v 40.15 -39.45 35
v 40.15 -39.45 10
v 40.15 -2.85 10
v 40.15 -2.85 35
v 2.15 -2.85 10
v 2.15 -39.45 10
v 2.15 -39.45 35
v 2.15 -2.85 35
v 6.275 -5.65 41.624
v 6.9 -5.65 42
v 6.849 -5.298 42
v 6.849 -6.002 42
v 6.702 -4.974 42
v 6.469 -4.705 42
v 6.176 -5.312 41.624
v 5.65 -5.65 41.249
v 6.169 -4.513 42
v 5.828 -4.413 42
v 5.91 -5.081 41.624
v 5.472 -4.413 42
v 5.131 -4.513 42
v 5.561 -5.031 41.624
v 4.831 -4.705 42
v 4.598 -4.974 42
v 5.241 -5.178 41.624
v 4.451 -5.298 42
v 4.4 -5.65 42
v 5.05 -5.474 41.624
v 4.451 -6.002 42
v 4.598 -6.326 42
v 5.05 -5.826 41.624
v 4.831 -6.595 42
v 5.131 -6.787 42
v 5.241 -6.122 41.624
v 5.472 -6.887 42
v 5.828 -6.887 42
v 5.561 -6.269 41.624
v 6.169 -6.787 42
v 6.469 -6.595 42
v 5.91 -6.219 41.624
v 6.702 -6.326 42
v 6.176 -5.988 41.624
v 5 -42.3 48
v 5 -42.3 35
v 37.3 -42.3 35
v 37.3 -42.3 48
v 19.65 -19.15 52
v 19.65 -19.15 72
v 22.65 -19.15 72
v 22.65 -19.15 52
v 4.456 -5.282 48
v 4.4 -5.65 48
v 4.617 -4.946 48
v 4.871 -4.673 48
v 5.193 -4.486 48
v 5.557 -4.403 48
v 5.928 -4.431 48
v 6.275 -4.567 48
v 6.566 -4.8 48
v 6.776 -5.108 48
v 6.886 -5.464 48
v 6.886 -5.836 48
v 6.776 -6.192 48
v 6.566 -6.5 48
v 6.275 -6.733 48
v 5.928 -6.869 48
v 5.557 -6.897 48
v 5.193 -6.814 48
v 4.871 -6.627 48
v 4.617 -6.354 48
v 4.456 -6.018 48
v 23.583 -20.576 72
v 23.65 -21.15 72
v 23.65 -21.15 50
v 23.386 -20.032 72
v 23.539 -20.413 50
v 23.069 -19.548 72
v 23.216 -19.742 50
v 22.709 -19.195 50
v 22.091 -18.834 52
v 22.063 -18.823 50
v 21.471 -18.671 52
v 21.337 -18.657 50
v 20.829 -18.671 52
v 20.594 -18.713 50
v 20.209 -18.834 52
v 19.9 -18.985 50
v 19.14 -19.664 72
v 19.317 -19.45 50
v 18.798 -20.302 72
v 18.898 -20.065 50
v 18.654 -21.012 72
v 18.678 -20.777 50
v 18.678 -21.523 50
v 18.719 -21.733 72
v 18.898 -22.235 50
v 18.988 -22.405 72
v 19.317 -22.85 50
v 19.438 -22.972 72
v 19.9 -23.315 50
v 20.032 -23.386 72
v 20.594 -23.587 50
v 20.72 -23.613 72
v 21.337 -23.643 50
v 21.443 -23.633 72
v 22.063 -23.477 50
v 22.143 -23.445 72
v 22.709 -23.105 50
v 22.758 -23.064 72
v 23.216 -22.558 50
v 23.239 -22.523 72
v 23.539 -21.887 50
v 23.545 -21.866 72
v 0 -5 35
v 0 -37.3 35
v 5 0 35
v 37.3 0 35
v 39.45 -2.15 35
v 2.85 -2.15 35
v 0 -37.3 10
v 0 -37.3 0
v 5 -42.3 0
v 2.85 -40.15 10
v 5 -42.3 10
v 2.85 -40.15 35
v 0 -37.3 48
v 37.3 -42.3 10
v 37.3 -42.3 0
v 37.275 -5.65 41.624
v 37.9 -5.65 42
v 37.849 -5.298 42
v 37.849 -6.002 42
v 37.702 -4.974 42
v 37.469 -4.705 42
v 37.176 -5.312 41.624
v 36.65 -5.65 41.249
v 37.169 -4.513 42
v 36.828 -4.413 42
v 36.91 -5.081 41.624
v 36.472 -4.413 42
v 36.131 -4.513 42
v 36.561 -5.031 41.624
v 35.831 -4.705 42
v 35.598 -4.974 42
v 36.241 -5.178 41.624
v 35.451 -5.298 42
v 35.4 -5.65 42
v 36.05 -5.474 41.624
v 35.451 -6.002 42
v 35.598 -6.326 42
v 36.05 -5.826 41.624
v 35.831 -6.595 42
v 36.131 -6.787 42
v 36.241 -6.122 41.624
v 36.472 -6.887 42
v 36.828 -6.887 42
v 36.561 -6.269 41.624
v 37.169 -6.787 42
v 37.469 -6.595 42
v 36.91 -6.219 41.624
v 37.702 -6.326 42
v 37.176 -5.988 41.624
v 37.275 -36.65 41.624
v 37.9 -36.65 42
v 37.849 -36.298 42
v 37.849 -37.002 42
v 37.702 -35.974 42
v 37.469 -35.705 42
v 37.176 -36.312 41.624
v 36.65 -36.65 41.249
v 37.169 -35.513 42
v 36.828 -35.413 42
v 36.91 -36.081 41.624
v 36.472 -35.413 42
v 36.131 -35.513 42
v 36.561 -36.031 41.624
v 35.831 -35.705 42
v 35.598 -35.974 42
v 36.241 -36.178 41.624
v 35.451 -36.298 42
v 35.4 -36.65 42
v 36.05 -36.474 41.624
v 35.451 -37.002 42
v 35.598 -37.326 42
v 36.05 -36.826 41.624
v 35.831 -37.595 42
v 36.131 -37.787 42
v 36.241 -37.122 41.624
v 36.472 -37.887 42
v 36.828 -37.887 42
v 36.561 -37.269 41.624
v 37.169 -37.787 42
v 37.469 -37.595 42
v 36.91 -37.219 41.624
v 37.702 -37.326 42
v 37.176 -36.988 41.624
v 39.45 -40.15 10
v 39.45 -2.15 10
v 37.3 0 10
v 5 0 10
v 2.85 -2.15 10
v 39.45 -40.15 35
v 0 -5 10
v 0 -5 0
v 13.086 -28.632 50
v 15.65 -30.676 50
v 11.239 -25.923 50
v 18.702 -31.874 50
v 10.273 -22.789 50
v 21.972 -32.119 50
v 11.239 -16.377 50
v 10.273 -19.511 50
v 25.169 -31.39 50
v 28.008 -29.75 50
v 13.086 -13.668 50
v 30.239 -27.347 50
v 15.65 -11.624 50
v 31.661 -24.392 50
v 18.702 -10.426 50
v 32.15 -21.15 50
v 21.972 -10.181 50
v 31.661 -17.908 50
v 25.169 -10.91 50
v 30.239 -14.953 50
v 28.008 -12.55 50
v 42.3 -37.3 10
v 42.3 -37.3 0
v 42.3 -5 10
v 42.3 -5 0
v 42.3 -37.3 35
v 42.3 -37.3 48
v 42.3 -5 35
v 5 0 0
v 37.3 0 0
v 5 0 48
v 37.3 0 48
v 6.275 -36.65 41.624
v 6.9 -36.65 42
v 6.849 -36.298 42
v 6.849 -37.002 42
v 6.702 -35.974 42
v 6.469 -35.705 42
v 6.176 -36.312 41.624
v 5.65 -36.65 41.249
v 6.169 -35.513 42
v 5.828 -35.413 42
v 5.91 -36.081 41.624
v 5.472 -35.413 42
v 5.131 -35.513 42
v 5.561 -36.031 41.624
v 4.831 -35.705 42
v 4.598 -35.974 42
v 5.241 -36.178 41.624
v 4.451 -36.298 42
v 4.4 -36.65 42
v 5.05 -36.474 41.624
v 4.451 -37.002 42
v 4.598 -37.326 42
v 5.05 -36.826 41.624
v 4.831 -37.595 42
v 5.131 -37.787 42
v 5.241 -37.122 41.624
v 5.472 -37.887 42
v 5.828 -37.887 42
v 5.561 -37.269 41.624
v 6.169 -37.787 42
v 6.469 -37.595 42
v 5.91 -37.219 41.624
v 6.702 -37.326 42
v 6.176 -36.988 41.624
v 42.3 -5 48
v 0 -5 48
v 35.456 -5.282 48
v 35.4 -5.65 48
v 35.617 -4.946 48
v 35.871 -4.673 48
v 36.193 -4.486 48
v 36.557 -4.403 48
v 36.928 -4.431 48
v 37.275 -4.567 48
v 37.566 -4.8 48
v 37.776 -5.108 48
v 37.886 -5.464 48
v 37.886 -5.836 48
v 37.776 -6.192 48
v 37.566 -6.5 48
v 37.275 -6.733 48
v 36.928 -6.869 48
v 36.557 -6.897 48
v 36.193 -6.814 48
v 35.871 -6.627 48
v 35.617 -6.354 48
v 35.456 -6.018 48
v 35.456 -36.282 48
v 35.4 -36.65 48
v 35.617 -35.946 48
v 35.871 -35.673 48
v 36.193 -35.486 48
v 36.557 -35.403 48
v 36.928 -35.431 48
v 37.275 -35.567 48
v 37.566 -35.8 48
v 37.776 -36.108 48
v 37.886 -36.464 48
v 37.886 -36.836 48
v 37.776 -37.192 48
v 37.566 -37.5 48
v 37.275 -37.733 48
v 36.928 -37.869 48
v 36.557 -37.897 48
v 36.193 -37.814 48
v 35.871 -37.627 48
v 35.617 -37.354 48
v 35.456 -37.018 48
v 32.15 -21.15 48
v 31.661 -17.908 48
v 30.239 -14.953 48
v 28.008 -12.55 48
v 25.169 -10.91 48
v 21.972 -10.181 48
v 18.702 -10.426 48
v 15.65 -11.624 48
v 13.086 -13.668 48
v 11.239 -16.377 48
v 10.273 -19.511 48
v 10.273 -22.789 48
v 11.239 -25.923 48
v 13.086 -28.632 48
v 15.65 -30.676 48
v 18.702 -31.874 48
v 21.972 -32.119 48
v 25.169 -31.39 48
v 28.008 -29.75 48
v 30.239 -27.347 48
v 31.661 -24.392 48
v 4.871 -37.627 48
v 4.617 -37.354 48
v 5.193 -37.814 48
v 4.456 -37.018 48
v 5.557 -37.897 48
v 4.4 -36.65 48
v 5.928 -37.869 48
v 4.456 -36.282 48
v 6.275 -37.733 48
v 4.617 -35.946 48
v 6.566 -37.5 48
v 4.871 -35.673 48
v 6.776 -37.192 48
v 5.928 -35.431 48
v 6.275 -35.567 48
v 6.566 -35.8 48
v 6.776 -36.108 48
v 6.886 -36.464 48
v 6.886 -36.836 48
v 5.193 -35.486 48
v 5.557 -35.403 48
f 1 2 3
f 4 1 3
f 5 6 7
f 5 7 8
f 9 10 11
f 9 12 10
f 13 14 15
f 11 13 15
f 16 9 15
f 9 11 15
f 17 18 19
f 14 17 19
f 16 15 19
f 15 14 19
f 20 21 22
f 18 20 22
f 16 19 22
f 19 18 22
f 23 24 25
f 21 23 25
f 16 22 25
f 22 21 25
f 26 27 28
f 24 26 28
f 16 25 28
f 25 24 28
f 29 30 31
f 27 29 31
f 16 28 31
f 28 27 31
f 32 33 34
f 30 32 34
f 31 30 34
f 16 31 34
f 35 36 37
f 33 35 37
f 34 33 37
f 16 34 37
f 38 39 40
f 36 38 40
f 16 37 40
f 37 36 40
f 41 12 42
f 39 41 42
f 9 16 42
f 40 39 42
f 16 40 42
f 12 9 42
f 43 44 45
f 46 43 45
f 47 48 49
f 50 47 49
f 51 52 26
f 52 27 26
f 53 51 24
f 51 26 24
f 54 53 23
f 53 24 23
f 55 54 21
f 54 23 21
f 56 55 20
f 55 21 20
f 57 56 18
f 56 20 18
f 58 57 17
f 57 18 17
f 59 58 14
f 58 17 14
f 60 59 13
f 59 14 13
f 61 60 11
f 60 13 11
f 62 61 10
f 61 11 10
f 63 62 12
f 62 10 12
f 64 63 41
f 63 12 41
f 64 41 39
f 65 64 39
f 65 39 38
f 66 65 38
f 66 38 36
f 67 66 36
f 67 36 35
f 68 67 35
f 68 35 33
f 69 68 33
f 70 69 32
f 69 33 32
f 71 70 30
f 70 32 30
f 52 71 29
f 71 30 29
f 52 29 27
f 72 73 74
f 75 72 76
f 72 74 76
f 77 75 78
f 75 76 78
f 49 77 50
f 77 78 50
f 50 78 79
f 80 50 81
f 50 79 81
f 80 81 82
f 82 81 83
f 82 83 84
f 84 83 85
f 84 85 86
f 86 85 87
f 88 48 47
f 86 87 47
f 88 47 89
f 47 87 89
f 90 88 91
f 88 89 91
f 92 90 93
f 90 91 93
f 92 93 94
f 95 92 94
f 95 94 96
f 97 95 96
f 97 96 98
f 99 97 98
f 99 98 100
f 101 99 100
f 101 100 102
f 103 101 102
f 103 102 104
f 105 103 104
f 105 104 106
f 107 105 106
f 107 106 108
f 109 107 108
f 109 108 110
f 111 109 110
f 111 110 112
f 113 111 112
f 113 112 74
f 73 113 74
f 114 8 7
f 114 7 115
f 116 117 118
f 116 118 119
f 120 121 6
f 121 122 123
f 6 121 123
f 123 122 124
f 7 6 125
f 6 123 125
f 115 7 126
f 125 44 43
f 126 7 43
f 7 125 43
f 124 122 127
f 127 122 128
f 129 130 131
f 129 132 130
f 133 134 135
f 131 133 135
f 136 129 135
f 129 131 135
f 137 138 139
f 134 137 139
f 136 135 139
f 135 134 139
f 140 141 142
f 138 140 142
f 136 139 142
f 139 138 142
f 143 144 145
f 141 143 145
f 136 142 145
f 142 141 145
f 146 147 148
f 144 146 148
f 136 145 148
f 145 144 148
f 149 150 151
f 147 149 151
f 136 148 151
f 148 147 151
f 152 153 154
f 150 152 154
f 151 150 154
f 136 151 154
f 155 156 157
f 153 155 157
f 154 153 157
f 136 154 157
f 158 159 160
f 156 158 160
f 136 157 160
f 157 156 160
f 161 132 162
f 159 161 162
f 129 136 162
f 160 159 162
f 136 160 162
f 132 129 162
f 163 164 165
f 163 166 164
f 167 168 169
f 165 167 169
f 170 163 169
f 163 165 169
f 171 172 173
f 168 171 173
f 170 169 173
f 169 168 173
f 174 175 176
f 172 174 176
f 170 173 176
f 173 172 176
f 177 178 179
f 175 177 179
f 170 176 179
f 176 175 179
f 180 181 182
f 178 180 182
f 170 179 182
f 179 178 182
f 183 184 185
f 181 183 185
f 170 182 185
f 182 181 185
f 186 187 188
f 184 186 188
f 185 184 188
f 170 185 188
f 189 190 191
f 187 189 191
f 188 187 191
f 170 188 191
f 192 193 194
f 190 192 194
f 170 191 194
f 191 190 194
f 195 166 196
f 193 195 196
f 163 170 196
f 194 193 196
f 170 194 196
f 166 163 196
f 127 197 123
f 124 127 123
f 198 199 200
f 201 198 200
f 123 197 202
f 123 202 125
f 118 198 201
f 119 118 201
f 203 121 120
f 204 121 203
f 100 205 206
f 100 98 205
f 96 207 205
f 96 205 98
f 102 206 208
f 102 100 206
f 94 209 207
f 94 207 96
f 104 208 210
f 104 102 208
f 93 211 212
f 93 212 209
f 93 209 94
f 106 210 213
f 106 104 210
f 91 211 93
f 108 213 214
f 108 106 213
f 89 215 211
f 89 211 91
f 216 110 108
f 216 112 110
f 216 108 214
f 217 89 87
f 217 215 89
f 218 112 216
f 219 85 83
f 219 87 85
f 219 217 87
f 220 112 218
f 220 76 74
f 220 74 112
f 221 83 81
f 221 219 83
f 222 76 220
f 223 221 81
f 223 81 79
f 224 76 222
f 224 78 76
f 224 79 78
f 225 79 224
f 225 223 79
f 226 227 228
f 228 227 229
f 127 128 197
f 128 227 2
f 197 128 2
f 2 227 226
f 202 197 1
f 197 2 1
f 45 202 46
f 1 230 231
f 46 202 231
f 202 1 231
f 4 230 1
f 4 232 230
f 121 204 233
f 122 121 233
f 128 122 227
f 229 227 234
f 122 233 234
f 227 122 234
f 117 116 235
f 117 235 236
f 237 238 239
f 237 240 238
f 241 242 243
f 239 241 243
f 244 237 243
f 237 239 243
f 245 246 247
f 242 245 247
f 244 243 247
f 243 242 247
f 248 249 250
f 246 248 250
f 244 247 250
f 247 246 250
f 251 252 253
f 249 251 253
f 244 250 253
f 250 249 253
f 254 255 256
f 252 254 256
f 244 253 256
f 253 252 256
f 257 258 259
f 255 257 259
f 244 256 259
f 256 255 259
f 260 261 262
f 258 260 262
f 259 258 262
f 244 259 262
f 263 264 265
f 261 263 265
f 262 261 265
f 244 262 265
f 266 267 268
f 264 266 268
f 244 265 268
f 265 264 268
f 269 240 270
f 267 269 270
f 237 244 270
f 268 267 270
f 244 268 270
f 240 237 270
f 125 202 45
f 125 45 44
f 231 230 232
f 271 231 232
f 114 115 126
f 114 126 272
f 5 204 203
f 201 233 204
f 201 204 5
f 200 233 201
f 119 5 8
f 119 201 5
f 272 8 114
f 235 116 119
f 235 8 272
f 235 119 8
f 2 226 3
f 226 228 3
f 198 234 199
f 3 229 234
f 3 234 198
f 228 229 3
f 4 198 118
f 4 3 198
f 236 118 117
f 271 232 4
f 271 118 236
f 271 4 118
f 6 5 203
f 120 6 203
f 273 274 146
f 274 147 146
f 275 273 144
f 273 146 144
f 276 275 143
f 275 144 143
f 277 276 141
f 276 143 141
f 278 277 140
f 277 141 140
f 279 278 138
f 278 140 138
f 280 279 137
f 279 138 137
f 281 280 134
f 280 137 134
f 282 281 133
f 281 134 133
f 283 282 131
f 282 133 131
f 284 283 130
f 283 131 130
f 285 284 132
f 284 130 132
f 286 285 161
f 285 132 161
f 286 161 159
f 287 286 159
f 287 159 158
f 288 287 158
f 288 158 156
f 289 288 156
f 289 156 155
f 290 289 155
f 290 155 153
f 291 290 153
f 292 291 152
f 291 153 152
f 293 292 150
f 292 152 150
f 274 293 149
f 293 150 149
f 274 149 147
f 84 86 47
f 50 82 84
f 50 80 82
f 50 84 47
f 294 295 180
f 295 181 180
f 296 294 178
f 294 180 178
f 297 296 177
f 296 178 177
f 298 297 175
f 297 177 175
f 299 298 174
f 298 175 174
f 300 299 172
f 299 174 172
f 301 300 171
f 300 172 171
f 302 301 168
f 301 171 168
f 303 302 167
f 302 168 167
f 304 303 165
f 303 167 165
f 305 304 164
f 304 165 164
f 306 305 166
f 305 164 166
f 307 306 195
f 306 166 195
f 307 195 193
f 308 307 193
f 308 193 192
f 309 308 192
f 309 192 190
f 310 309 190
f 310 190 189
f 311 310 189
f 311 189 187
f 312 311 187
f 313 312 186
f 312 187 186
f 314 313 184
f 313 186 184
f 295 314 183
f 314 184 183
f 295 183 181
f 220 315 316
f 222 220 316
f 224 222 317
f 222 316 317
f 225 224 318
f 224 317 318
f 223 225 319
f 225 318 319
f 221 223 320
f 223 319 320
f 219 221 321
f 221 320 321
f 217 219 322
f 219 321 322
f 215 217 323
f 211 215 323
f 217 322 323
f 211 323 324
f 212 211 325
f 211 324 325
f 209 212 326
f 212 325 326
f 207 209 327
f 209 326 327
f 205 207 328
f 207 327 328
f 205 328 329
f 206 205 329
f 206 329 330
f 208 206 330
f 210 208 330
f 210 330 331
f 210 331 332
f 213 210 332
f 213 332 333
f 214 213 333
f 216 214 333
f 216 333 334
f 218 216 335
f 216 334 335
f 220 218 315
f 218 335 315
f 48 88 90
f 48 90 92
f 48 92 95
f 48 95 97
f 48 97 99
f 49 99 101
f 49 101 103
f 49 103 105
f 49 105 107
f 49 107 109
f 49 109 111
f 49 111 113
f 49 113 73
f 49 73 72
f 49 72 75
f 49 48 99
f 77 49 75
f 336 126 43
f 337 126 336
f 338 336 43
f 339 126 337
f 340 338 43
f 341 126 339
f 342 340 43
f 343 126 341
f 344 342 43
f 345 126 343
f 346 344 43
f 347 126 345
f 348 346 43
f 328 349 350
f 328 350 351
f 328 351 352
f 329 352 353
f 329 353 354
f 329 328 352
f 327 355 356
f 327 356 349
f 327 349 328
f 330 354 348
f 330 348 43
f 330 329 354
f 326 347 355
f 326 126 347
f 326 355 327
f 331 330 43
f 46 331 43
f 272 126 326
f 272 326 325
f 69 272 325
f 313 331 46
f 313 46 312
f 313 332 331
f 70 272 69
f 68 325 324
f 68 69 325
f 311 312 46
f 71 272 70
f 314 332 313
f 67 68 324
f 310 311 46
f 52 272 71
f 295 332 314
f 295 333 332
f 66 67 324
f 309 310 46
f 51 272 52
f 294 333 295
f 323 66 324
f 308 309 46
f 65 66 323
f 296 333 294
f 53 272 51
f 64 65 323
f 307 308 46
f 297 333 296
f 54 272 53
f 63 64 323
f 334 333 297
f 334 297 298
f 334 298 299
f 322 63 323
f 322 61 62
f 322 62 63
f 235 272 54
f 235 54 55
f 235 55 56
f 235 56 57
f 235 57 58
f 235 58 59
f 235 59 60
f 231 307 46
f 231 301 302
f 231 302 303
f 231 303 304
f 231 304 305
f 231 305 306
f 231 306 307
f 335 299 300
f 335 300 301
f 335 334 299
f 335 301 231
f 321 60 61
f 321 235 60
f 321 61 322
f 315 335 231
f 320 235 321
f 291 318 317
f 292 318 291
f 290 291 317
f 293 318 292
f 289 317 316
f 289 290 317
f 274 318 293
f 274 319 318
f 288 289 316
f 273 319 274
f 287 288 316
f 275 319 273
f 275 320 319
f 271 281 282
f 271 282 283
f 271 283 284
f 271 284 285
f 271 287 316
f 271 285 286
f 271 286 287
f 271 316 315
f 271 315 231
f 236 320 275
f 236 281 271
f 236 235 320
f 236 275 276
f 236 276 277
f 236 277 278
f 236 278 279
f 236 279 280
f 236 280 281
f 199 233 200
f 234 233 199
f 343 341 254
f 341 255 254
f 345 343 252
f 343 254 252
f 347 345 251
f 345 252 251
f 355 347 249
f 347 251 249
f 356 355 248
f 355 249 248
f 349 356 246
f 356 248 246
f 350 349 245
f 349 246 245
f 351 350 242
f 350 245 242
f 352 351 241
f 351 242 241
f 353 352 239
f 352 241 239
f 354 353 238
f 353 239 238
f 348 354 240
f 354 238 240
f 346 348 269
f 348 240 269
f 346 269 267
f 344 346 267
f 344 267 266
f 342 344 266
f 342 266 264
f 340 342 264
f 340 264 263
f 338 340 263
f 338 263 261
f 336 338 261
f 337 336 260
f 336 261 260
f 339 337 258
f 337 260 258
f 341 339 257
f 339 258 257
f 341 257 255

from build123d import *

# Parameters (mm, degrees)
SKETCH_1_W             = 42.3
SKETCH_1_H             = 42.3
EXTRUDE_1_DEPTH        = 48
SKETCH_2_R             = 11
EXTRUDE_2_DEPTH        = 2
SKETCH_3_R             = 2.5
EXTRUDE_3_DEPTH        = 22
CHAMFER_1_SIZE         = 5
HOLE_WIZARD_M3_1_D     = 2.5
HOLE_WIZARD_M3_1_DEPTH = 6
HOLE_WIZARD_M3_1_TIP   = 0.751075774
SKETCH_7_OUTSIDE_W     = 63.022
SKETCH_7_OUTSIDE_H     = 63.022
SKETCH_7_OUTSIDE_W_2   = 38
SKETCH_7_OUTSIDE_H_2   = 38
CUT_EXTRUDE_2_DEPTH    = 25
SKETCH_8_W             = 6.700255884
SKETCH_8_H             = 1.991967966
CUT_EXTRUDE_3_DEPTH    = 20


with BuildPart() as part:
    # 草图1 → 凸台-拉伸1 (new body)
    with BuildSketch(Plane.XY):
        with Locations((21.15, -21.15)):
            Rectangle(SKETCH_1_W, SKETCH_1_H)
    extrude(amount=EXTRUDE_1_DEPTH)

    # 草图2 → 凸台-拉伸2 (add)
    with BuildSketch(Plane.XY.offset(48)):
        with Locations((21.15, -21.15)):
            Circle(SKETCH_2_R)
    extrude(amount=EXTRUDE_2_DEPTH)

    # 草图3 → 凸台-拉伸3 (add)
    with BuildSketch(Plane.XY.offset(50)):
        with Locations((21.15, -21.15)):
            Circle(SKETCH_3_R)
    extrude(amount=EXTRUDE_3_DEPTH)

    # 倒角1
    chamfer_1_edges = [part.edges().sort_by_distance(p)[0] for p in [
        (0, 0, 24),
        (42.3, 0, 24),
        (42.3, -42.3, 24),
        (0, -42.3, 24),
    ]]
    chamfer(chamfer_1_edges, length=CHAMFER_1_SIZE)

    # M3 螺纹孔1
    with Locations(Plane(origin=(5.65, -5.65, 48), x_dir=(1, 0, 0), z_dir=(0, 0, 1))):
        with Locations((0, 0), (0, -31), (31, -31), (31, 0)):
            Hole(HOLE_WIZARD_M3_1_D / 2, depth=HOLE_WIZARD_M3_1_DEPTH)
            with Locations((0, 0, -(HOLE_WIZARD_M3_1_DEPTH + HOLE_WIZARD_M3_1_TIP / 2))):  # 118° drill point
                Cone(0, HOLE_WIZARD_M3_1_D / 2, HOLE_WIZARD_M3_1_TIP, mode=Mode.SUBTRACT)

    # 草图7 outside → 切除-拉伸2 (cut)
    with BuildSketch(Plane(origin=(0, 0, 10), x_dir=(-1, 0, 0), z_dir=(0, 0, -1))):
        with Locations((-21.15, -21.15)):
            Rectangle(SKETCH_7_OUTSIDE_W, SKETCH_7_OUTSIDE_H)
        with Locations((-21.15, -21.15)):
            Rectangle(SKETCH_7_OUTSIDE_W_2, SKETCH_7_OUTSIDE_H_2, mode=Mode.SUBTRACT)
    extrude(amount=-CUT_EXTRUDE_2_DEPTH, mode=Mode.SUBTRACT)

    # 草图8 → 切除-拉伸3 (cut)
    with BuildSketch(Plane.XY.offset(72)):
        with Locations((21.681661742, -18.154016017)):
            Rectangle(SKETCH_8_W, SKETCH_8_H)
    extrude(amount=-CUT_EXTRUDE_3_DEPTH, mode=Mode.SUBTRACT)


solid = part.part
